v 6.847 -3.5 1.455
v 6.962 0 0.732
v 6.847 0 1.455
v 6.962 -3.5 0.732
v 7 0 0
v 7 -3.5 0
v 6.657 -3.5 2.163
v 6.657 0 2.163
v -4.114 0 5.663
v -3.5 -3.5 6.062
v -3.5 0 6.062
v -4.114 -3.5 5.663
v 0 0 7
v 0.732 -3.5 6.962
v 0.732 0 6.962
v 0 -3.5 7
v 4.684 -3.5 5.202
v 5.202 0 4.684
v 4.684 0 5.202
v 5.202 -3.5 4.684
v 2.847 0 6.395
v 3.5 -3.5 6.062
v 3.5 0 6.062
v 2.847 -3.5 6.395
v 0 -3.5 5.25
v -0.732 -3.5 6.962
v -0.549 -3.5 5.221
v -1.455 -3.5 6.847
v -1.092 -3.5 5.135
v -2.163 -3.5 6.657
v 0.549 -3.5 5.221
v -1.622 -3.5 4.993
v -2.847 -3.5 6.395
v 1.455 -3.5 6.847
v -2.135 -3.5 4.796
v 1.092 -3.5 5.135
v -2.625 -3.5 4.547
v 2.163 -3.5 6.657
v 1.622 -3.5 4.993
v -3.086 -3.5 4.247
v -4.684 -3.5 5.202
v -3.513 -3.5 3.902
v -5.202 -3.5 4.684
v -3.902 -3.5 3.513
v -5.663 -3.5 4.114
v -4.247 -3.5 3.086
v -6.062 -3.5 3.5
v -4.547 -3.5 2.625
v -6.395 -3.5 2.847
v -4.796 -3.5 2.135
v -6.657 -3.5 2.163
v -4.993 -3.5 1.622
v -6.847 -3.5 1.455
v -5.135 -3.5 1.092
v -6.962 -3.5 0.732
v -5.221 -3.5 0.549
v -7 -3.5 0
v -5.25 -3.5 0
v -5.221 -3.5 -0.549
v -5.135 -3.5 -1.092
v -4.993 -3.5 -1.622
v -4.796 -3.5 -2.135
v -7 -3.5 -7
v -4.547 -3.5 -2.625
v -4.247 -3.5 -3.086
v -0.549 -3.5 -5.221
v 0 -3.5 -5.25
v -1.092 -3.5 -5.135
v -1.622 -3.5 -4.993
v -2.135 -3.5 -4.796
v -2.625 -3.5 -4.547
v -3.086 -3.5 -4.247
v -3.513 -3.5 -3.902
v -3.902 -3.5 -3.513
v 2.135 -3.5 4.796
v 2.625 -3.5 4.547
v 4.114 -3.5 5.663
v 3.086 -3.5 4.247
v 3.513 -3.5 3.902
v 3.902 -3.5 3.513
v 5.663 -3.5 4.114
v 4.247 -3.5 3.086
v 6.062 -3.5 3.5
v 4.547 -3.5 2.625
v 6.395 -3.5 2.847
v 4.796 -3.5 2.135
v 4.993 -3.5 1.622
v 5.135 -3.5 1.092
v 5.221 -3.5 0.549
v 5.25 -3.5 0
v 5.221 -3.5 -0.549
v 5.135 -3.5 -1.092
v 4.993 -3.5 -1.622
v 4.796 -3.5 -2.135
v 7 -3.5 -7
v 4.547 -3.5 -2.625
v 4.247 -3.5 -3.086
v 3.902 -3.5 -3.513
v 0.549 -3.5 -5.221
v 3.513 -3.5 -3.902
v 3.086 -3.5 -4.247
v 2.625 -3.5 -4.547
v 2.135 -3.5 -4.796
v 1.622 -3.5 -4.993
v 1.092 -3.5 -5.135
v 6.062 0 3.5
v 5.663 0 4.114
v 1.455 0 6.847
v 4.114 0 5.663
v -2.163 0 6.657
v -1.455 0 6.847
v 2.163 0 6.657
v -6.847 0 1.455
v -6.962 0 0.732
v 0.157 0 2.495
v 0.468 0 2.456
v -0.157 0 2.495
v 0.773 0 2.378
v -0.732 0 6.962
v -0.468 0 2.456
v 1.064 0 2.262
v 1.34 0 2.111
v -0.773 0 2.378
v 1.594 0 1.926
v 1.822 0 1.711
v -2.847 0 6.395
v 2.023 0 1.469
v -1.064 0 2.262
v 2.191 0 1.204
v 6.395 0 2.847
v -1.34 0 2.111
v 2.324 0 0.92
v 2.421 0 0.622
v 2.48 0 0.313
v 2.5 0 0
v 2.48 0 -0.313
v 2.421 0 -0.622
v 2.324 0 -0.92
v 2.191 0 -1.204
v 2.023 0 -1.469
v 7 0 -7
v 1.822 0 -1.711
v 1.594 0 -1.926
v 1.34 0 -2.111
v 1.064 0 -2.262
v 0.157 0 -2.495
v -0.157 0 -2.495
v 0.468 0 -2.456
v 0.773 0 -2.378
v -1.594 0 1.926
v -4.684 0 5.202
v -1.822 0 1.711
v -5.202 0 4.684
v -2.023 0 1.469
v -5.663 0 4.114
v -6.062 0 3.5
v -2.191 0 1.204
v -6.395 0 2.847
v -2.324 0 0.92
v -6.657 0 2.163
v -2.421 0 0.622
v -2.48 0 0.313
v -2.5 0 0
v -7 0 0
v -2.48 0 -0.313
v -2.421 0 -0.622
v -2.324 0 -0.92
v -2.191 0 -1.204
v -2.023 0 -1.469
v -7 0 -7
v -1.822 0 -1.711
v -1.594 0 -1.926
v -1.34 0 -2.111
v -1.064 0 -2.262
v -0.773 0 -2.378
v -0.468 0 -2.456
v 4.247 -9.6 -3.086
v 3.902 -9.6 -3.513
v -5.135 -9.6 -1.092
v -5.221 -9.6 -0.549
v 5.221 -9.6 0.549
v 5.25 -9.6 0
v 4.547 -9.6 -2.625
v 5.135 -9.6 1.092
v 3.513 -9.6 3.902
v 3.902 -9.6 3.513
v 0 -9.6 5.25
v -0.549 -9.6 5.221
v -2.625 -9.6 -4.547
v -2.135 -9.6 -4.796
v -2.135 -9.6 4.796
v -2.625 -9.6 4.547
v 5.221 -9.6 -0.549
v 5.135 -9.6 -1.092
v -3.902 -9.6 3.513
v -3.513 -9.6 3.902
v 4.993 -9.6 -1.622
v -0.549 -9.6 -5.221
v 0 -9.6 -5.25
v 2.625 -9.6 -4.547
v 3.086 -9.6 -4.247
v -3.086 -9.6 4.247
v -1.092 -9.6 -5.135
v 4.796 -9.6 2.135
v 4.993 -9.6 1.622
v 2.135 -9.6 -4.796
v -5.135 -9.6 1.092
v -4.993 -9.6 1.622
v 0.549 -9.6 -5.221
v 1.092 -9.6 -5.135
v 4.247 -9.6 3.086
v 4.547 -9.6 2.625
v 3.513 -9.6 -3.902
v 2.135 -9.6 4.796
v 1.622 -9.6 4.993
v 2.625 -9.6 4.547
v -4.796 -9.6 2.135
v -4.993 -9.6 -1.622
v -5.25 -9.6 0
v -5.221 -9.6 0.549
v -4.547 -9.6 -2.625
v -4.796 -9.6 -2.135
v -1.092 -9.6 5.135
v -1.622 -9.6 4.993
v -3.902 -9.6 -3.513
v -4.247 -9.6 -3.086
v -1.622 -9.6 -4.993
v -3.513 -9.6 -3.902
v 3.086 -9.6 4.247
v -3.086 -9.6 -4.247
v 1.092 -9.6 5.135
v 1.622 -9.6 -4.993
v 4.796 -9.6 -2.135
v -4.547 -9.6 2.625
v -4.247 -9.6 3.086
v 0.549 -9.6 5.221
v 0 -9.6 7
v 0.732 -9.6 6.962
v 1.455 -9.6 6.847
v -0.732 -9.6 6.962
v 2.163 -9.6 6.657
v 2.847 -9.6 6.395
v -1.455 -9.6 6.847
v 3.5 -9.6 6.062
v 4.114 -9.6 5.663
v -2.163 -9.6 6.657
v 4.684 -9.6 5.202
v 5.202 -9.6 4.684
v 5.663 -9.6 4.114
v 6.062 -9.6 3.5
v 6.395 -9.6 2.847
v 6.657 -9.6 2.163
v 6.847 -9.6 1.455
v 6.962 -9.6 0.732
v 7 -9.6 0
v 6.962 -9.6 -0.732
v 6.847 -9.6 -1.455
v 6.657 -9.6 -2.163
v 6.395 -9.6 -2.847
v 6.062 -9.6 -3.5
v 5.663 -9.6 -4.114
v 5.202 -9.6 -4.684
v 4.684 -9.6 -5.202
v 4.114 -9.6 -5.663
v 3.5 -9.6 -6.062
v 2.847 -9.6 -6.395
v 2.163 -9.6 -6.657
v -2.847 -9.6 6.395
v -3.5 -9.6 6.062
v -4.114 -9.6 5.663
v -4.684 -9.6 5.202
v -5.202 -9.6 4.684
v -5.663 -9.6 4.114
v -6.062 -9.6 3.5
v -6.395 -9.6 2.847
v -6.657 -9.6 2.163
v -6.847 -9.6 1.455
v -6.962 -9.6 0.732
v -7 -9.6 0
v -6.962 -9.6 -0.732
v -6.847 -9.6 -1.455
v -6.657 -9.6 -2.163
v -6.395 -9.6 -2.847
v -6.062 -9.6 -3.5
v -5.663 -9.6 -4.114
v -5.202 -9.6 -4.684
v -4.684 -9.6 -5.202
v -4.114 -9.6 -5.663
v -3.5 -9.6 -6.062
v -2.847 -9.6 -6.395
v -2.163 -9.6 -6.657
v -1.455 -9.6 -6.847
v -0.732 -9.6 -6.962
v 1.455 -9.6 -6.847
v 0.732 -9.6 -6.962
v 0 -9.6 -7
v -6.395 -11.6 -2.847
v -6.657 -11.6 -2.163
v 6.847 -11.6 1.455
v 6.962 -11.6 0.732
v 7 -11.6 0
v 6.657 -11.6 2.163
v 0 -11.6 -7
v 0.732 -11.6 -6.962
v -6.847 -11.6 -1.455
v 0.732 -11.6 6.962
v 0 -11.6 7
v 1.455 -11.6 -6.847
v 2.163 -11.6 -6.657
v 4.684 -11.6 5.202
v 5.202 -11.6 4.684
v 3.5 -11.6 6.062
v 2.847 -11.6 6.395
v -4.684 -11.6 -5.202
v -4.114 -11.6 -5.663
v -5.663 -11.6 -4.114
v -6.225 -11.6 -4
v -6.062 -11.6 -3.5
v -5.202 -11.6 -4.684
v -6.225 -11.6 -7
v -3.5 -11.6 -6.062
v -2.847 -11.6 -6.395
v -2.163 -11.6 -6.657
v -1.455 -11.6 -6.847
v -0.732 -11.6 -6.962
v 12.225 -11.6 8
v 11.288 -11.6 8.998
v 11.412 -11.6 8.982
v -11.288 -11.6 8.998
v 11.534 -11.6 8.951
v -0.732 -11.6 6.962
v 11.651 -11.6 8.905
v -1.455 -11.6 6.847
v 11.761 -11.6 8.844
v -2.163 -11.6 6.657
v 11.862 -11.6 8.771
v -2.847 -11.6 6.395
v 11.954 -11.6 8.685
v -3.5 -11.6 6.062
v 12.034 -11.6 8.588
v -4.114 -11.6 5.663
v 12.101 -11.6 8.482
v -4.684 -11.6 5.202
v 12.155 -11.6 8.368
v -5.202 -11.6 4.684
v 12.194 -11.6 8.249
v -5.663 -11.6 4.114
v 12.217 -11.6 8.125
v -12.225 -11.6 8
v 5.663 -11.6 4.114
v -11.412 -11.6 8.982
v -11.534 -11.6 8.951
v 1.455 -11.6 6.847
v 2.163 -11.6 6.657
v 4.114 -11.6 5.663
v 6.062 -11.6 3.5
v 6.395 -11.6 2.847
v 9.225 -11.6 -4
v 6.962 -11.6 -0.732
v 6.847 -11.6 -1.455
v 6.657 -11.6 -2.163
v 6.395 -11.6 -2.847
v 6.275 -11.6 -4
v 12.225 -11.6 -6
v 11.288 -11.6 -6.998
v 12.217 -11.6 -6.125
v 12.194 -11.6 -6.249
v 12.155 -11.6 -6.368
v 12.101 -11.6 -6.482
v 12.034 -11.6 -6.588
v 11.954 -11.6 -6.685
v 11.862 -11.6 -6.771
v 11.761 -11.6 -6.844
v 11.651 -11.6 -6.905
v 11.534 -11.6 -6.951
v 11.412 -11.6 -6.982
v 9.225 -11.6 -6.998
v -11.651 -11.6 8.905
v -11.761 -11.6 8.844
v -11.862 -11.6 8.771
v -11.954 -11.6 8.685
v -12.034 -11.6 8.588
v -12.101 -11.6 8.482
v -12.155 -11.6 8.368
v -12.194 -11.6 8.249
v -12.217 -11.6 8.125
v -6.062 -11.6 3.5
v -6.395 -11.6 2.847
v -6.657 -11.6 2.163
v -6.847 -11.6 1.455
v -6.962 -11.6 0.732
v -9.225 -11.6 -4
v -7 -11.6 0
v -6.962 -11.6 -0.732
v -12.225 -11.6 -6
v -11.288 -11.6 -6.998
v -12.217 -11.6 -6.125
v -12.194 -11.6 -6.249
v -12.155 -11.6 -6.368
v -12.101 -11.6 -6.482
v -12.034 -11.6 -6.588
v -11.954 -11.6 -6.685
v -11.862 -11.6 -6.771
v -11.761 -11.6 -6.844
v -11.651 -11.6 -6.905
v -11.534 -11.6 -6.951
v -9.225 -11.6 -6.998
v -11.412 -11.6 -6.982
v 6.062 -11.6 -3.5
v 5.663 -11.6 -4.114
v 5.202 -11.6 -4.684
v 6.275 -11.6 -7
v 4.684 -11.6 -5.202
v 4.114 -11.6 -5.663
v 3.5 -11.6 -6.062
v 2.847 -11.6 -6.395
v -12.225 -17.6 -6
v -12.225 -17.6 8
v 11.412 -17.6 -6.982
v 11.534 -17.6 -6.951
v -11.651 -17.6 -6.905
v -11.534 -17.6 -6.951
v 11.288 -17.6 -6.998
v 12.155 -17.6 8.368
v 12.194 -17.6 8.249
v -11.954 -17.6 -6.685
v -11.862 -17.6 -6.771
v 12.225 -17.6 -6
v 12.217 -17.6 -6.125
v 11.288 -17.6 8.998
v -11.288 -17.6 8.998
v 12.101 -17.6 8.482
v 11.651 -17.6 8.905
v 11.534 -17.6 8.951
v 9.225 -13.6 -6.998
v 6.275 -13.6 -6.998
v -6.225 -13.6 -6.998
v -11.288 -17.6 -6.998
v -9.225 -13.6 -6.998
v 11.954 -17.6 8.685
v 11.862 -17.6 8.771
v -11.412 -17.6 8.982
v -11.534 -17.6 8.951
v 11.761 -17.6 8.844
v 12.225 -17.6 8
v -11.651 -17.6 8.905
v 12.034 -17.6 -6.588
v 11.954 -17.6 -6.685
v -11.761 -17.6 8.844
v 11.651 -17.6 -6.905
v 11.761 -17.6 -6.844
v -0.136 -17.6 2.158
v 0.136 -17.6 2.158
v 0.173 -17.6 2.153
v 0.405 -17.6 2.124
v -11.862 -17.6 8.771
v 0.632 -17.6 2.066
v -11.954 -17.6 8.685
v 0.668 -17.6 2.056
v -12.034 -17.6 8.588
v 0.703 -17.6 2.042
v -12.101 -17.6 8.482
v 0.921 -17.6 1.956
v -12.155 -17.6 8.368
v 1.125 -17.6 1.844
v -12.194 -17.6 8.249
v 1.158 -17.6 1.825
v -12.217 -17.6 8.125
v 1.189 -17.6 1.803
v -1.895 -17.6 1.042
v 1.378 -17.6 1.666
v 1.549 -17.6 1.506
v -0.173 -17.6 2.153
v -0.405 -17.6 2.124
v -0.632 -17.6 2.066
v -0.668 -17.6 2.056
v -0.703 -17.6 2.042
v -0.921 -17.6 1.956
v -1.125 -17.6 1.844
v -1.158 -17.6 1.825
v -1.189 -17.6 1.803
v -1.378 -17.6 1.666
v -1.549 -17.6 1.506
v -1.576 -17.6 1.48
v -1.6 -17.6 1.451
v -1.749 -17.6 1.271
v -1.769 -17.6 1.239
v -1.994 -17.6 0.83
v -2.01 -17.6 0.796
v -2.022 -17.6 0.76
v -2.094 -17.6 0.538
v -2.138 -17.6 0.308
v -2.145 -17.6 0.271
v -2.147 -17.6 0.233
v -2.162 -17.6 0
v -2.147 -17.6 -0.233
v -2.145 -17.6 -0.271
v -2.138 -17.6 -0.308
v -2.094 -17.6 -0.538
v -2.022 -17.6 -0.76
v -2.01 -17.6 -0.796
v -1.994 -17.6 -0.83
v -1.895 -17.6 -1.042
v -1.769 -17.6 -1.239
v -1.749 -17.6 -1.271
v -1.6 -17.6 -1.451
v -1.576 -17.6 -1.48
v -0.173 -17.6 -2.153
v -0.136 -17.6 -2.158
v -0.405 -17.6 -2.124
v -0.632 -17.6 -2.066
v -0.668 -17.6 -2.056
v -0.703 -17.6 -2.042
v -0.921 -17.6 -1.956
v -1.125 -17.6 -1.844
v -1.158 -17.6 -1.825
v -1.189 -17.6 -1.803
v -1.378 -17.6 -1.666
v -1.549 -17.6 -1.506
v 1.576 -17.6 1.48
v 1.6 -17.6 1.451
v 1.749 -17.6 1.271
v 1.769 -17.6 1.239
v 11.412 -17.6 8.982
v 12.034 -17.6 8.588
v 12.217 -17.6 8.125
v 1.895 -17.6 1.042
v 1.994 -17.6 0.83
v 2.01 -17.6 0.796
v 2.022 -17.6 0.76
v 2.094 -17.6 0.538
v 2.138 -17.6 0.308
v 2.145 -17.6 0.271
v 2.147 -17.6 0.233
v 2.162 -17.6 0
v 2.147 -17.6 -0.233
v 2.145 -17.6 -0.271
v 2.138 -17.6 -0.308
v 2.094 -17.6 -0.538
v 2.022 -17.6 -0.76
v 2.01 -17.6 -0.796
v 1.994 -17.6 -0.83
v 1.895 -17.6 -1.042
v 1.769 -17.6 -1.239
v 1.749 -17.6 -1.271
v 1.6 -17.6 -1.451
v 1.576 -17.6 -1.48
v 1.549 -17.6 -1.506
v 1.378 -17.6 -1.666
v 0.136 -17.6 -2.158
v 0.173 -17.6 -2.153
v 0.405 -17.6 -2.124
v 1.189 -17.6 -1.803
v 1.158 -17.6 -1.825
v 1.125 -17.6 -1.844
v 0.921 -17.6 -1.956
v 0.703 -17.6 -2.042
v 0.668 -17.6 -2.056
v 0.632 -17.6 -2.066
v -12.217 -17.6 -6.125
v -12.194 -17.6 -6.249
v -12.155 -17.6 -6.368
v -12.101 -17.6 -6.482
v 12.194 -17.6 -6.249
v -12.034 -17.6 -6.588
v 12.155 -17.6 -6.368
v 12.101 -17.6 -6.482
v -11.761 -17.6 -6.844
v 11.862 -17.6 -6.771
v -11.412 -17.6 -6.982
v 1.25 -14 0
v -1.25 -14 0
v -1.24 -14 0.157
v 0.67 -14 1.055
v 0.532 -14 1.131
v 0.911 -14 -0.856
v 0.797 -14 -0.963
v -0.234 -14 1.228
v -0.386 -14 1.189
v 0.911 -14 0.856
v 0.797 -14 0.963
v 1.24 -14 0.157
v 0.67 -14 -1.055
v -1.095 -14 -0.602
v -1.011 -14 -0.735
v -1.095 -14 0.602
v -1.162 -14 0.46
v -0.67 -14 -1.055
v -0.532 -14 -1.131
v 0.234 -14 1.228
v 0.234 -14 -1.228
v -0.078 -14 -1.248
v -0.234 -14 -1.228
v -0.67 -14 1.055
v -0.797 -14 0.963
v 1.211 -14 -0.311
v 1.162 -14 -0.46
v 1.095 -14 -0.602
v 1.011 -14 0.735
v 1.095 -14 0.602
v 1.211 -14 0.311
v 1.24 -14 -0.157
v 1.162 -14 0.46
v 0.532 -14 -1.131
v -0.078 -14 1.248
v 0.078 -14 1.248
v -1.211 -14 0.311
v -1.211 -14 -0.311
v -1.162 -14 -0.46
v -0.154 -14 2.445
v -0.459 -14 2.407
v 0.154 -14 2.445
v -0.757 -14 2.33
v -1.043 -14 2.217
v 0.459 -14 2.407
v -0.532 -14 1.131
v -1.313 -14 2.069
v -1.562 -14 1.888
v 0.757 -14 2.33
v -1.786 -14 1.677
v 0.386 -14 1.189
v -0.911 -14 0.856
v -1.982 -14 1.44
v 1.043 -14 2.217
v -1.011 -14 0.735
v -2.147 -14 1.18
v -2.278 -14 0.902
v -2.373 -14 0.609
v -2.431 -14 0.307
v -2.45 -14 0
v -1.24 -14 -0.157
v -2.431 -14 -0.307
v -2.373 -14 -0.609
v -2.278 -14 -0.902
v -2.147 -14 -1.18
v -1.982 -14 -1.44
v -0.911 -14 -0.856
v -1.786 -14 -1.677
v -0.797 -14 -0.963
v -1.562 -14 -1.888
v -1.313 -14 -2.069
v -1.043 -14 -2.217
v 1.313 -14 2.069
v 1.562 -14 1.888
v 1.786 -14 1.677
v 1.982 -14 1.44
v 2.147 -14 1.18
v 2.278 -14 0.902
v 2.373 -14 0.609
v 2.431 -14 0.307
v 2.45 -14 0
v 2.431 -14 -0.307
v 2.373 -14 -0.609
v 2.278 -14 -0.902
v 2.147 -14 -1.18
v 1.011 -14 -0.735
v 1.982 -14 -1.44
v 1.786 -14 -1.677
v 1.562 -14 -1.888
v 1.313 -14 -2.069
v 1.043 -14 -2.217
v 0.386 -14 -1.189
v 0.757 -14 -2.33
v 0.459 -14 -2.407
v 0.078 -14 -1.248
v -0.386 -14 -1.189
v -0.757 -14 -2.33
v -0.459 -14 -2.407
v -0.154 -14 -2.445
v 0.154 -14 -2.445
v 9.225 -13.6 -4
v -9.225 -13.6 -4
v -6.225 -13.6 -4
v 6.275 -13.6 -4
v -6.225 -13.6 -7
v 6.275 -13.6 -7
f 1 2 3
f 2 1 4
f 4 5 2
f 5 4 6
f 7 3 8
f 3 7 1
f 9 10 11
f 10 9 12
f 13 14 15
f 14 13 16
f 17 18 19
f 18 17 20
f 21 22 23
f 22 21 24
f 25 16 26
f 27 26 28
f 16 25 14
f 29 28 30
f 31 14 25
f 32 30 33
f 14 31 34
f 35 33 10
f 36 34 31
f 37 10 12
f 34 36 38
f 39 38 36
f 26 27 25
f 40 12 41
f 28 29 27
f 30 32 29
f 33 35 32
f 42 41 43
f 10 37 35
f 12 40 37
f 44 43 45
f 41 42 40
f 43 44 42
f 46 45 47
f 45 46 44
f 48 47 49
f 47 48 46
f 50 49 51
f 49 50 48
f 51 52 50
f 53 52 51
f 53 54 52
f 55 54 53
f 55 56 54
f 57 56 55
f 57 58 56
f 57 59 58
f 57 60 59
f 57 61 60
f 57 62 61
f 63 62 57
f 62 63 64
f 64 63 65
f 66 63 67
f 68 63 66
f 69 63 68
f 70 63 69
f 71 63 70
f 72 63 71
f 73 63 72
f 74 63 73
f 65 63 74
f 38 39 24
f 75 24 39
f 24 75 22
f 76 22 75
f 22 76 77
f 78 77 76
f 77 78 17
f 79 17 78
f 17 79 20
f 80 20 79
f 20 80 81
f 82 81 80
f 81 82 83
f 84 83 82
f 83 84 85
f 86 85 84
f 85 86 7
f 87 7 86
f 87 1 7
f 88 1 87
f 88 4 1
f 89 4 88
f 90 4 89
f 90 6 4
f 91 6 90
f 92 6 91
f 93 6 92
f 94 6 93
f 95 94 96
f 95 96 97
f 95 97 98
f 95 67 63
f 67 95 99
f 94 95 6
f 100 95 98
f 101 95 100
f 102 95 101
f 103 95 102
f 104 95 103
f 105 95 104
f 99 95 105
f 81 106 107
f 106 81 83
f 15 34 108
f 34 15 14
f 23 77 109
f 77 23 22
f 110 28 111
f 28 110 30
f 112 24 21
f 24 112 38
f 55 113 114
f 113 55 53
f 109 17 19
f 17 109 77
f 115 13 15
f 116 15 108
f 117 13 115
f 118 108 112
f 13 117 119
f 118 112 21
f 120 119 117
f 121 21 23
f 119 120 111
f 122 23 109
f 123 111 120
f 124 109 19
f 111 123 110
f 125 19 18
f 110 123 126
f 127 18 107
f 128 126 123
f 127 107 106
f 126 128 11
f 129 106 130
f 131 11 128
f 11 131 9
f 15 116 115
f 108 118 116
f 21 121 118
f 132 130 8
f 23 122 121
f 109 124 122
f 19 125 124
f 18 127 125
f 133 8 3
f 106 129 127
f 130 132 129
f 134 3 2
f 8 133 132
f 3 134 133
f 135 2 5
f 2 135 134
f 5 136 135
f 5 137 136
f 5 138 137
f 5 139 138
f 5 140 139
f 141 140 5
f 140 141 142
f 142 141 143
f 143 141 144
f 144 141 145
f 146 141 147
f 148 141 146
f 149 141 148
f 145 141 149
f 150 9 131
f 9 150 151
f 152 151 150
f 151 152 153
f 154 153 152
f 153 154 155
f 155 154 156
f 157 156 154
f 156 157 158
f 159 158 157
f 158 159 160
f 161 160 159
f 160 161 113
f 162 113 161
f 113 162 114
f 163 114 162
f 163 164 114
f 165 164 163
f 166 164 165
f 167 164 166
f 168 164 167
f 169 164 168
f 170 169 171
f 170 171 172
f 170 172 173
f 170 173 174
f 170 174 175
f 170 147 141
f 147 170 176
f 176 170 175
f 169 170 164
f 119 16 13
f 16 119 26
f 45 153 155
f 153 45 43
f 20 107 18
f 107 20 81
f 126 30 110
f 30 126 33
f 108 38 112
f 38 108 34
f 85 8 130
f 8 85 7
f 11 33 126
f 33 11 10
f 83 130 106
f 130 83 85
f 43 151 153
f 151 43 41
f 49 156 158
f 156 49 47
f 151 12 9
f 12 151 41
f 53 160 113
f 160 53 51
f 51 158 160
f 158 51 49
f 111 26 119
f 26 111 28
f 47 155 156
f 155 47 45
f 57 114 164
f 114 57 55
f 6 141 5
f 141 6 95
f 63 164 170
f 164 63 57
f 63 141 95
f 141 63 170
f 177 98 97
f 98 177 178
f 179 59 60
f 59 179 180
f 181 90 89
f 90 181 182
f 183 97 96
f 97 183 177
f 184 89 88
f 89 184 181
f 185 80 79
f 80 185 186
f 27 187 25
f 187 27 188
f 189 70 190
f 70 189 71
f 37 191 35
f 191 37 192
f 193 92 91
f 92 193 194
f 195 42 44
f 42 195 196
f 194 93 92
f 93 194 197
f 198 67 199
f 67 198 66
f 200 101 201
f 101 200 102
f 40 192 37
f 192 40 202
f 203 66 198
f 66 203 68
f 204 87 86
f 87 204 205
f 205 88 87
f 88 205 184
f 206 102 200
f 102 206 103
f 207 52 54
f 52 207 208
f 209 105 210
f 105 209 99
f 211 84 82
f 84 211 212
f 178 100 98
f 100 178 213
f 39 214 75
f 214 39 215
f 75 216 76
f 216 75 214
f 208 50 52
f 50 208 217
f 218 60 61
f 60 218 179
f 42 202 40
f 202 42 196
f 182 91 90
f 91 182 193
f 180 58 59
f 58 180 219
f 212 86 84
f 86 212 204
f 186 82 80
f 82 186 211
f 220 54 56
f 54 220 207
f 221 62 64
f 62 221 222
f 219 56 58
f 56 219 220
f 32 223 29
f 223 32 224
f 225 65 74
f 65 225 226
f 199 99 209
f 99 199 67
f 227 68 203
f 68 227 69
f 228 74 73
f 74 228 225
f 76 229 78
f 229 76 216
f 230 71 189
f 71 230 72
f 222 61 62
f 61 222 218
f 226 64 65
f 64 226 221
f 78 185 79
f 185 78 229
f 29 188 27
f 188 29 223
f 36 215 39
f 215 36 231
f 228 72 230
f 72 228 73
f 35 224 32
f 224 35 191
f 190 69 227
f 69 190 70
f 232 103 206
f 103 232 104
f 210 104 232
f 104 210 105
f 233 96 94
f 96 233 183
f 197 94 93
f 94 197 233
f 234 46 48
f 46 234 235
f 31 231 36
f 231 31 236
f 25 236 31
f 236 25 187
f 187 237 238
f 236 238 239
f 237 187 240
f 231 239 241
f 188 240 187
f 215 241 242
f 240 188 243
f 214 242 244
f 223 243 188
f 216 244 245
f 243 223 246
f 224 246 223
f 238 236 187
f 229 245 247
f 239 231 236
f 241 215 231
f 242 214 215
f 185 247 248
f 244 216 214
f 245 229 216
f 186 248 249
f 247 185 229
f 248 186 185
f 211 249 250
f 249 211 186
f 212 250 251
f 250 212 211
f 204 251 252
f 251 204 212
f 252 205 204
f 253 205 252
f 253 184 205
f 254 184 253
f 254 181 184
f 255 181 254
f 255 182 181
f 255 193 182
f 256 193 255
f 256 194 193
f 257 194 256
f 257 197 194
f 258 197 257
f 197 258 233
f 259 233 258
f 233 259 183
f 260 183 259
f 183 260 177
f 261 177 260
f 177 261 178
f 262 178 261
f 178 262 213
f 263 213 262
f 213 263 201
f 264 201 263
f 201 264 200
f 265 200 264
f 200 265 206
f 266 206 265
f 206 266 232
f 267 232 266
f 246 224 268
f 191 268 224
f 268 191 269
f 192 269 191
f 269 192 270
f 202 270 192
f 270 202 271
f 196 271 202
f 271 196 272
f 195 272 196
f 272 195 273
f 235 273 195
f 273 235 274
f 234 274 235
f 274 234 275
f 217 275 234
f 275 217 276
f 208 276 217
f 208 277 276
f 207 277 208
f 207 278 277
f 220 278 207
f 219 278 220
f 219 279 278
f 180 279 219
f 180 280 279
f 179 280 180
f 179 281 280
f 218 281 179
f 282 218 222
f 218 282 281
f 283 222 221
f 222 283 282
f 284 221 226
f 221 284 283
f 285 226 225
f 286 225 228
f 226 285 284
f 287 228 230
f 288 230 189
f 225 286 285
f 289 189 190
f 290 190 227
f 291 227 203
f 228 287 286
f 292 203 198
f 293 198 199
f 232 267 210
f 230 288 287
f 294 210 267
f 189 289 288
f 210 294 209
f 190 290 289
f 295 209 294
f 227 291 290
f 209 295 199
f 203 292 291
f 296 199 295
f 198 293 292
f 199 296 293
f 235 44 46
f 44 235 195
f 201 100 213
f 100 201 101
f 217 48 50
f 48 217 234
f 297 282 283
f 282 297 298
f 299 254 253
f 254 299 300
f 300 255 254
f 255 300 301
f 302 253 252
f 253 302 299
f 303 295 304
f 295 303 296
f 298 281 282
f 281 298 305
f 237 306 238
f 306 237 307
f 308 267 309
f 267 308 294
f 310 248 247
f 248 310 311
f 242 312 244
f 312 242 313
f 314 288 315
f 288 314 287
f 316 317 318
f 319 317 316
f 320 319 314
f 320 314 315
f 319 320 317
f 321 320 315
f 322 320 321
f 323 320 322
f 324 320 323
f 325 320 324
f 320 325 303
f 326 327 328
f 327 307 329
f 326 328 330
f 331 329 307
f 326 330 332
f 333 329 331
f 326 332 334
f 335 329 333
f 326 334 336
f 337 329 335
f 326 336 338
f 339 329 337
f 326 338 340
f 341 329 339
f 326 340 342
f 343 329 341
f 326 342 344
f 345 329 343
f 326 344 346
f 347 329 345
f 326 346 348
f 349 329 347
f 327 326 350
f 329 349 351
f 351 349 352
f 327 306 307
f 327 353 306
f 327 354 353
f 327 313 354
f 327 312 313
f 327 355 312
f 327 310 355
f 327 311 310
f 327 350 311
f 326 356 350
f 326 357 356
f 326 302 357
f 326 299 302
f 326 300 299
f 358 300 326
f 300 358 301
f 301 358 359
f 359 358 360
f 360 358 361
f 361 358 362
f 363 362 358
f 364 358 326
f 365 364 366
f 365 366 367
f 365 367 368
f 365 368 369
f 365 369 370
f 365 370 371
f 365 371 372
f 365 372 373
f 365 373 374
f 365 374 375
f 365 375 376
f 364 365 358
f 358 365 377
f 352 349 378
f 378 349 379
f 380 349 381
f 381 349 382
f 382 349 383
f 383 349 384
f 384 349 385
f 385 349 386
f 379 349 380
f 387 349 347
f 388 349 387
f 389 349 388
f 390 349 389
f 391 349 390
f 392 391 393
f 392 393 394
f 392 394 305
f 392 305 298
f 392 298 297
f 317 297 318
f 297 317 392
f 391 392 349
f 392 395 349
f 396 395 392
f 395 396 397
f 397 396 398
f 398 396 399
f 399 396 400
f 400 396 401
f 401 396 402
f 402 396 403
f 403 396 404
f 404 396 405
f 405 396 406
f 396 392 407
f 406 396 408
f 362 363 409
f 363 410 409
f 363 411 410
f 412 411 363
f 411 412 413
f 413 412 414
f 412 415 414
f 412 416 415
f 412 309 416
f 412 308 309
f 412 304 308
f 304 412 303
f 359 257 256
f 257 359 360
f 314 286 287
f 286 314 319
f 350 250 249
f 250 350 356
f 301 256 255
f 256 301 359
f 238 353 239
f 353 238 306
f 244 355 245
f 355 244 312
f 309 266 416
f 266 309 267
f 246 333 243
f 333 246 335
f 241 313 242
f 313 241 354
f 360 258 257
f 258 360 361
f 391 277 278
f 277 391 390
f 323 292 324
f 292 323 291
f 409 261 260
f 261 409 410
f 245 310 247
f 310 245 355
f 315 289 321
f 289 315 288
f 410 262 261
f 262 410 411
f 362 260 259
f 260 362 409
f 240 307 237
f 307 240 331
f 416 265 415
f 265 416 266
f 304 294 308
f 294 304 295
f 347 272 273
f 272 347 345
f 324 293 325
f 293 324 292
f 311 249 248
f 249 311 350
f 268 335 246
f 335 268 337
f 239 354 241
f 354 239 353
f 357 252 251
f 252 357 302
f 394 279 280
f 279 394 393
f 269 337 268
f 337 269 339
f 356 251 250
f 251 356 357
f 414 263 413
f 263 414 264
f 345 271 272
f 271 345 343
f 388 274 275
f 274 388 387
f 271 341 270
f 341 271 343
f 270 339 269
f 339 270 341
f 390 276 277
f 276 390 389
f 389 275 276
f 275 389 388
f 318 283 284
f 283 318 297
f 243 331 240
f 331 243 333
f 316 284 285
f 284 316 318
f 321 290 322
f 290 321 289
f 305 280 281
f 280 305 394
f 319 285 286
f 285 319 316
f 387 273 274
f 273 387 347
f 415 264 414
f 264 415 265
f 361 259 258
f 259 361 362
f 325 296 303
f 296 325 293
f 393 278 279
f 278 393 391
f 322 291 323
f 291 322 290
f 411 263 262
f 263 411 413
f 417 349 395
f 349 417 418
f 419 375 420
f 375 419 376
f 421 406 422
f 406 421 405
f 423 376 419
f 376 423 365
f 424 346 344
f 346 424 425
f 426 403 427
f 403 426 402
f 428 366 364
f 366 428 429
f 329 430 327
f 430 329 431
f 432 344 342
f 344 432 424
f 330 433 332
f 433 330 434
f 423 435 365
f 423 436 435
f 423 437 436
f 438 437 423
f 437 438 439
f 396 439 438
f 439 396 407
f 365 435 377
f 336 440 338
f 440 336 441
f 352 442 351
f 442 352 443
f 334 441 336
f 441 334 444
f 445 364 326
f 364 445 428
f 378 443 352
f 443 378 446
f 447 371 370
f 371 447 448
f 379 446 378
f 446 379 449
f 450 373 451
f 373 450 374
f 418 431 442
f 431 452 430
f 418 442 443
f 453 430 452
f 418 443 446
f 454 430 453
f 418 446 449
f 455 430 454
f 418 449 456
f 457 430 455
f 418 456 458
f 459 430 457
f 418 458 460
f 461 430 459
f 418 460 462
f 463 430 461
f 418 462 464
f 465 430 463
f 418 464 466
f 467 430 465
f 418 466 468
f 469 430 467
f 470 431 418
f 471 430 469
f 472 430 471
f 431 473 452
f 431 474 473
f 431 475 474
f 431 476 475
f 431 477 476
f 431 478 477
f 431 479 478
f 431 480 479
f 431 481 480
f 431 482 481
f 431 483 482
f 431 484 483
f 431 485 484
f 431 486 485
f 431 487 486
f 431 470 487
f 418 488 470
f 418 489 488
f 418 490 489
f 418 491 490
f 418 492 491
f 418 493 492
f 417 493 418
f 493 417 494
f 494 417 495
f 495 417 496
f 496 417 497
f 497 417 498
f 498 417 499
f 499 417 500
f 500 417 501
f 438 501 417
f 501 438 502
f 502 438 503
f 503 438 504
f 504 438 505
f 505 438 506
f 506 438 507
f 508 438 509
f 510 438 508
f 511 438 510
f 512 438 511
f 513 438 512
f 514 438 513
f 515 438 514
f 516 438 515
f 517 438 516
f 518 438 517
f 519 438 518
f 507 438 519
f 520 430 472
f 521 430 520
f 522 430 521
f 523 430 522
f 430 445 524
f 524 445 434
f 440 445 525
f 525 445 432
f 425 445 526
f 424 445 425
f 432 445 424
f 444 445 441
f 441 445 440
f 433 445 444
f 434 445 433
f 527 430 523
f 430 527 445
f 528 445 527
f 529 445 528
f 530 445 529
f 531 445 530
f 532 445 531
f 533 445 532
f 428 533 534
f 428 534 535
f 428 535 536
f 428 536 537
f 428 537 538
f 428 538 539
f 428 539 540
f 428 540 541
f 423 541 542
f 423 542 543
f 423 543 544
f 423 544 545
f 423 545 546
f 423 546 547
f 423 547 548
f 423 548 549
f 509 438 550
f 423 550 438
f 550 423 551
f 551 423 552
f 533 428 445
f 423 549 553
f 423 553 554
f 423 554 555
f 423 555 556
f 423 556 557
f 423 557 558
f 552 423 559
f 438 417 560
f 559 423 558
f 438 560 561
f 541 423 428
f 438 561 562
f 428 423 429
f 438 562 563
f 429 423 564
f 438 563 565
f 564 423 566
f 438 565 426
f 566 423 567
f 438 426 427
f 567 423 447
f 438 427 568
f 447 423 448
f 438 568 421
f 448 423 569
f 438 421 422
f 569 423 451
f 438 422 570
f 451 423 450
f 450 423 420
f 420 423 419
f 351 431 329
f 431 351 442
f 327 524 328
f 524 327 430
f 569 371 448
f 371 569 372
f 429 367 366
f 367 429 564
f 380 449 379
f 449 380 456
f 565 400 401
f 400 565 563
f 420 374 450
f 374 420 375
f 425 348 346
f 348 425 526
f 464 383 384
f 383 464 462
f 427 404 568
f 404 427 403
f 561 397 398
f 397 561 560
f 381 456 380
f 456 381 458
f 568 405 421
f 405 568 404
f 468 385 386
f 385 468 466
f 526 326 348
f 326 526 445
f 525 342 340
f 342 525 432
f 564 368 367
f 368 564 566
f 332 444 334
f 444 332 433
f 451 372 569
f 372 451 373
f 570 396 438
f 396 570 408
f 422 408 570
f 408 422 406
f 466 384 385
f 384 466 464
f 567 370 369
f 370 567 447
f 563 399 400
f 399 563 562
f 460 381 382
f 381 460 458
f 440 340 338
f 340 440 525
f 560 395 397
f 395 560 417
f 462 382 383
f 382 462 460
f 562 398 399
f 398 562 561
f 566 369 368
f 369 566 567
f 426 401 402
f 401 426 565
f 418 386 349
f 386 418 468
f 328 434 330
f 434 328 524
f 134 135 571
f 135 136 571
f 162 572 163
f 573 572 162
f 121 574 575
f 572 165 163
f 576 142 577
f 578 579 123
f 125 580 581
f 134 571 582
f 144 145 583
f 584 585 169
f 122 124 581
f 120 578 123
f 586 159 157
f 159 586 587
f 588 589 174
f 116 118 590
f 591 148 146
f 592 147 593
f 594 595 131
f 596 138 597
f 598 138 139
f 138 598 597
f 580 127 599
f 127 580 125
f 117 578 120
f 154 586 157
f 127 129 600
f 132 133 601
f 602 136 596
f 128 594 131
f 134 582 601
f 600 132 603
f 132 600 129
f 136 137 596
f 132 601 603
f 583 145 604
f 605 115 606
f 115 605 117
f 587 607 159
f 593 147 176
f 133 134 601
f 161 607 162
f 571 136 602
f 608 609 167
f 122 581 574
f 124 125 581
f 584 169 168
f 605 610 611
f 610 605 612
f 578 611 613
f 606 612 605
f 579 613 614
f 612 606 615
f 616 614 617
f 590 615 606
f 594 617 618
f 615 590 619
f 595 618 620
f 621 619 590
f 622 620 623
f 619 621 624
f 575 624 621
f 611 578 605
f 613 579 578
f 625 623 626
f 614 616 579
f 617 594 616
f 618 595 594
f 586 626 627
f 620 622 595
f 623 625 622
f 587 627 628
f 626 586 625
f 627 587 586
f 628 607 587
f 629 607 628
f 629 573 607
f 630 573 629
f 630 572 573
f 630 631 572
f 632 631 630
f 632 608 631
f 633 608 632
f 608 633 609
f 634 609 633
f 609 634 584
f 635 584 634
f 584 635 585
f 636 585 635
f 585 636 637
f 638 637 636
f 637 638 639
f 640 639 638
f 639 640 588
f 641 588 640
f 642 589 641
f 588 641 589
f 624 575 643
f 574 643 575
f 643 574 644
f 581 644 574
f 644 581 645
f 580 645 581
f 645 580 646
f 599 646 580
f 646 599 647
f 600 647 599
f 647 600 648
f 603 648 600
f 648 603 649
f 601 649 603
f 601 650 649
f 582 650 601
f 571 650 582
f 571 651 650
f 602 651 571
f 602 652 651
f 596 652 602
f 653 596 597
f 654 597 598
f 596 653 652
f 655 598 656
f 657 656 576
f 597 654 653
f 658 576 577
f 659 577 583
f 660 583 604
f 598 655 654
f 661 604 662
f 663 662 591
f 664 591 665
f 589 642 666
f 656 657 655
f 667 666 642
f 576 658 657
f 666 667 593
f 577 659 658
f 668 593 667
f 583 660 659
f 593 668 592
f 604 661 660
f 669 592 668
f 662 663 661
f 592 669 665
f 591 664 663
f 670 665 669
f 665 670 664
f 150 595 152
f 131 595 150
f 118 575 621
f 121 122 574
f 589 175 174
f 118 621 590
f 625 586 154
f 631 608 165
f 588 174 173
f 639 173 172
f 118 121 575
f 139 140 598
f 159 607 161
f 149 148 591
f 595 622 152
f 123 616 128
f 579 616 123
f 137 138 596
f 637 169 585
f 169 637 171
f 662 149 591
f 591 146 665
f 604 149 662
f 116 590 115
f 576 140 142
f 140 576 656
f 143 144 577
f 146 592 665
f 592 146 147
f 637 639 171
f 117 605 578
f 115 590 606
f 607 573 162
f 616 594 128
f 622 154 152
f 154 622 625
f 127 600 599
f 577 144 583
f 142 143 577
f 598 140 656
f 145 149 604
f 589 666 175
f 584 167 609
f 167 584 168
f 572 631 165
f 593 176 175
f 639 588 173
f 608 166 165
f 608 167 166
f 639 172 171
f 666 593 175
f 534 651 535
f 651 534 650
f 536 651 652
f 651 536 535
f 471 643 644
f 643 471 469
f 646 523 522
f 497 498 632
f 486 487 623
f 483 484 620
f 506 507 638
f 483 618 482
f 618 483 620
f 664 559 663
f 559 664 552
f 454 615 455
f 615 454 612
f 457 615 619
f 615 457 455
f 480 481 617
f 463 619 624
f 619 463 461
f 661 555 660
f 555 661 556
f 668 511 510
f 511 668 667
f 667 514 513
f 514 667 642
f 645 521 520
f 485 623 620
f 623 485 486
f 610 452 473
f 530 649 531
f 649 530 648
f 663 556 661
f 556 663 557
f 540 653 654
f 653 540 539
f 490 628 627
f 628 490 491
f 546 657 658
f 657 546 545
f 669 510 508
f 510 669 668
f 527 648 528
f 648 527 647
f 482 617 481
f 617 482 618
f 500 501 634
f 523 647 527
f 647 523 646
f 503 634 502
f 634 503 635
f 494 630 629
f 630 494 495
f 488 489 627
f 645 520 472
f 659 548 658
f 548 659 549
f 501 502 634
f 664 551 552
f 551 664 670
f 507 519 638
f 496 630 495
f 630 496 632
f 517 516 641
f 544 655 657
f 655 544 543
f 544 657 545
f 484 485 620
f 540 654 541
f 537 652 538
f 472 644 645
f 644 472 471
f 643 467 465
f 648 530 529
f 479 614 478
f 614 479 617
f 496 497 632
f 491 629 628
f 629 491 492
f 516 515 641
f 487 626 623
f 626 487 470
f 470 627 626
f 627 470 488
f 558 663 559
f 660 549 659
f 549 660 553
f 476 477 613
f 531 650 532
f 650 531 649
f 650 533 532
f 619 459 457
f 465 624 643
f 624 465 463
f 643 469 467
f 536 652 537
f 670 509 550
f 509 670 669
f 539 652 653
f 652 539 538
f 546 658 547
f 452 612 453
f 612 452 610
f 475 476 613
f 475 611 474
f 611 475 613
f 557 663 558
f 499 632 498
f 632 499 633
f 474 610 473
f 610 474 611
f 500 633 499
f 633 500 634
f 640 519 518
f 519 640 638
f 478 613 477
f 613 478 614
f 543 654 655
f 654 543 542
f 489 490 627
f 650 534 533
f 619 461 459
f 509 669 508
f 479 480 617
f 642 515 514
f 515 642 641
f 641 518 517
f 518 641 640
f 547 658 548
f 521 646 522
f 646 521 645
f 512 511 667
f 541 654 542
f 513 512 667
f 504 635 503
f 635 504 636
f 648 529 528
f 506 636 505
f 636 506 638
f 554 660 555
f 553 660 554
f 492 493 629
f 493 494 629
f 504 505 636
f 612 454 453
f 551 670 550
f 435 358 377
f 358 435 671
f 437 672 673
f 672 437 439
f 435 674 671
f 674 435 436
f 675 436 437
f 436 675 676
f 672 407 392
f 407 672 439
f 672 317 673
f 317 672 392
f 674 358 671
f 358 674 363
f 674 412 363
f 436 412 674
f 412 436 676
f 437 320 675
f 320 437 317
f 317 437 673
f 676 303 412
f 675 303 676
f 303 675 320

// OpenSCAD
// Tevo Extruder Boden Adapter

Rund=14.00;
Dick=3.50;
Innen=10.50 ;
Hoch=6.1;
Front=2.00;
CubeBreit=22.45;
CubeHoch=14.00;
CubeTief=5.00;
BPush=4.9;
BPush2=2.50;
PushHoch=10.00;
DVorn=5.00;
DVorn2=2.50;
HVorn=14.00;
module Adapter () {
difference () {
union () {
cylinder (Dick,d=Rund,Center=true,$fn=60);
   translate ([-Rund/2,-Rund/2,0]) cube ([Rund,Rund/2,Dick]);
translate ([0,0,Dick]) cylinder (Hoch,d=Innen,Center=true,$fn=60);
translate ([0,0,Dick+Hoch]) cylinder (Front,d=Rund,Center=true,$fn=60);
$fn=50;
minkowski()
{
translate ([-CubeBreit/2,-Rund/2+1,Dick+Hoch+Front+0.5]) cube ([CubeBreit,CubeHoch,CubeTief]);
   //cylinder(r=2,h=CubeTief/2); 
    cylinder (1, center=true);
}
}
cylinder (h=HVorn,d1=DVorn,d2=DVorn2,$fn=50);
translate ([0,0,HVorn]) cylinder (h=PushHoch+5,d1=BPush,d2=BPush2,$fn=50);
translate ([-CubeBreit/2+2,-Rund/2,Dick+Hoch+Front]) cube ([CubeBreit-4,3,2]);

}
translate ([-CubeBreit/2+5,-Rund/2,Dick+Hoch+Front]) cube ([12.5,3,2]);
}
rotate ([90,0,0]) Adapter ();
//Adapter ();
